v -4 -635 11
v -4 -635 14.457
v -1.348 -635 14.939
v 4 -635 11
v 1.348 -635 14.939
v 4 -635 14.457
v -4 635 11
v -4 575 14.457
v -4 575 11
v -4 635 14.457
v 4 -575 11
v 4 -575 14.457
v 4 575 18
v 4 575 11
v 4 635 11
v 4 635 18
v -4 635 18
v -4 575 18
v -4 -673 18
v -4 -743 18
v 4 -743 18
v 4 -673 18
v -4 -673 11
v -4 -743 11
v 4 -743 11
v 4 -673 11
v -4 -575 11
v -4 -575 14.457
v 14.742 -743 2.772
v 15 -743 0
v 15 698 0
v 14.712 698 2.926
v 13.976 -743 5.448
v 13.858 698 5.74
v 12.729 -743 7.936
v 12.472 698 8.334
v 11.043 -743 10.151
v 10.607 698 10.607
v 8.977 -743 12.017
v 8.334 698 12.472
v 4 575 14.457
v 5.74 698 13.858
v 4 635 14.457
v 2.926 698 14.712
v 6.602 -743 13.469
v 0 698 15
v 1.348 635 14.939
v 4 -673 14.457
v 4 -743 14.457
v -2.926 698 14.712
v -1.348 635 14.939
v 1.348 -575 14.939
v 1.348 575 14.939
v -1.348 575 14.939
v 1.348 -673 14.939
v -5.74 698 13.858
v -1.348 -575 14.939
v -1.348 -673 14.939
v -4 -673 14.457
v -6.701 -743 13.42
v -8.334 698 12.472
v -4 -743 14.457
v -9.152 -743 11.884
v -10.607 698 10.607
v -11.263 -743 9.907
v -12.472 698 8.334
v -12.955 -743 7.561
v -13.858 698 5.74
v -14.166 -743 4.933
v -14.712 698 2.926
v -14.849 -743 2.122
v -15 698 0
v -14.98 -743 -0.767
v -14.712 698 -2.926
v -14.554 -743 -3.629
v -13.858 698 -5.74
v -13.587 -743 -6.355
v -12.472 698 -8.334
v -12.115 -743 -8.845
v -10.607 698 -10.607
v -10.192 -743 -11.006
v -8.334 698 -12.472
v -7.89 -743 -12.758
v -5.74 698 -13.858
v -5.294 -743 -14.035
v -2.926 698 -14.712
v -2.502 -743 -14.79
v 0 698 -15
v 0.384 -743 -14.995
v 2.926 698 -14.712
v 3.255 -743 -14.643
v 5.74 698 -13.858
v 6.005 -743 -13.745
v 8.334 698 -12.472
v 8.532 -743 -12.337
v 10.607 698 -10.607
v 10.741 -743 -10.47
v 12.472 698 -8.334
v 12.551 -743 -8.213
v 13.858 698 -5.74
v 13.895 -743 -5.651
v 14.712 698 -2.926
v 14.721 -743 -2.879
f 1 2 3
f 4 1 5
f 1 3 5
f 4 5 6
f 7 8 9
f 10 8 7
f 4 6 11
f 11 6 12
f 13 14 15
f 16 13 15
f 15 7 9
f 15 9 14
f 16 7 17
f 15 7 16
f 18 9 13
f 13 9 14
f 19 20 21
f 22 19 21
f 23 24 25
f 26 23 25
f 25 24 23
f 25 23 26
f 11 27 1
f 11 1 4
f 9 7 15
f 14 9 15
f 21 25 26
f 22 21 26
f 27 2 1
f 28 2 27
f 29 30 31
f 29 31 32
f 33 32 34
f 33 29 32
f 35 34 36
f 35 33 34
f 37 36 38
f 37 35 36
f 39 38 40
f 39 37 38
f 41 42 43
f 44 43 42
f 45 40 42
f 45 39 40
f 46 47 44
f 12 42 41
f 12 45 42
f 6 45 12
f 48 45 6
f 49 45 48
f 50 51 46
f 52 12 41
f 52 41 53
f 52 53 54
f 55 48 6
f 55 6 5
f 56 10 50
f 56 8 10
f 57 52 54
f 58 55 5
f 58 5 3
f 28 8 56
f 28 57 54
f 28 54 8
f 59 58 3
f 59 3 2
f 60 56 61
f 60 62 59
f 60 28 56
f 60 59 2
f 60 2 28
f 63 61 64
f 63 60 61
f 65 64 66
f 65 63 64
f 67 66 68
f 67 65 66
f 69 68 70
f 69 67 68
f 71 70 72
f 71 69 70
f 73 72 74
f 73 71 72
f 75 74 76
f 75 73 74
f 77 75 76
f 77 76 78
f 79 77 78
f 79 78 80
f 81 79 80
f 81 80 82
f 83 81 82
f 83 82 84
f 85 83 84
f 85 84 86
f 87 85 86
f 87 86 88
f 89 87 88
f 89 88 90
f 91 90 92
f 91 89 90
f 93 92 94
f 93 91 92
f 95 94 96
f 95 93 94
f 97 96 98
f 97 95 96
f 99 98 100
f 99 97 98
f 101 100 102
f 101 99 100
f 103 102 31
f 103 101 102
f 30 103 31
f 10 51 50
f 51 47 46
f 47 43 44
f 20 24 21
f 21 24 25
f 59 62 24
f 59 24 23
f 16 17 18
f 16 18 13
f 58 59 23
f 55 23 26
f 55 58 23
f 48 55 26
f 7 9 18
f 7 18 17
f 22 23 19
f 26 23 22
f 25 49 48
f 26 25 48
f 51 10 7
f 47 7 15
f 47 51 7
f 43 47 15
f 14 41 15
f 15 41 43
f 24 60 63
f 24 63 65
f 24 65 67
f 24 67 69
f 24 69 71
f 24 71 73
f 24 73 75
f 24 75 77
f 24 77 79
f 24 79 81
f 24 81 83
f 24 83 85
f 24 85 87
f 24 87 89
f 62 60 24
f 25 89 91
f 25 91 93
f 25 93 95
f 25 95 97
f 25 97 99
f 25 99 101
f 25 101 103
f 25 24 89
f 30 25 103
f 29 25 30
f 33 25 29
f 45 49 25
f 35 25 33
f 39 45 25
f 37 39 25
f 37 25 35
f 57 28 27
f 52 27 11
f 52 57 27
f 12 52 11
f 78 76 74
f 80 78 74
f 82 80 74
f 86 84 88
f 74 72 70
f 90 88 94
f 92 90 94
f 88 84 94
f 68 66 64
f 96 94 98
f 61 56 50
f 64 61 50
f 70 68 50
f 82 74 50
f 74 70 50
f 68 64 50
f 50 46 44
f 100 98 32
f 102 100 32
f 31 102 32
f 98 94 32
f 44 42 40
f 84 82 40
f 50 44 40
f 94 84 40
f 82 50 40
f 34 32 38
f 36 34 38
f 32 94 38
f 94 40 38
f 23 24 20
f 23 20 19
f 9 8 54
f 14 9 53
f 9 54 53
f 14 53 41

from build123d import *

# Parameters (mm, degrees)
F0_R          = 15
F1_DEPTH      = 743
F1_DEPTH_BACK = 698
F3_W          = 8
F3_H          = 60
F3_H_2        = 70
F4_DEPTH      = 4
F4_FACE_W     = 8
F4_FACE_H     = 70
F4_FACE_H_2   = 60
F5_DEPTH      = 7


with BuildPart() as f1:
    # F0 (on Front) → F1 (new body, two sides)
    with BuildSketch(Plane.XZ) as f1_sk:
        Circle(F0_R)
    extrude(amount=F1_DEPTH)
    extrude(f1_sk.sketch, amount=-F1_DEPTH_BACK)

    # F3 (on offset) → F4 (cut)
    with BuildSketch(Plane.XY.offset(15)):
        with Locations((0, 605)):
            Rectangle(F3_W, F3_H)
        with Locations((0, -605)):
            Rectangle(F3_W, F3_H)
        with Locations((0, -708)):
            Rectangle(F3_W, F3_H_2)
    extrude(amount=-F4_DEPTH, mode=Mode.SUBTRACT)


with BuildPart() as f5:
    # F4_face (on face) → F5 (new body)
    with BuildSketch(Plane(origin=(0, -708, 11), x_dir=(1, 0, 0), z_dir=(0, 0, 1))):
        Rectangle(F4_FACE_W, F4_FACE_H)
        with Locations((0, 1313)):
            Rectangle(F4_FACE_W, F4_FACE_H_2)
    extrude(amount=F5_DEPTH)


solid = Compound([f1.part, f5.part])
